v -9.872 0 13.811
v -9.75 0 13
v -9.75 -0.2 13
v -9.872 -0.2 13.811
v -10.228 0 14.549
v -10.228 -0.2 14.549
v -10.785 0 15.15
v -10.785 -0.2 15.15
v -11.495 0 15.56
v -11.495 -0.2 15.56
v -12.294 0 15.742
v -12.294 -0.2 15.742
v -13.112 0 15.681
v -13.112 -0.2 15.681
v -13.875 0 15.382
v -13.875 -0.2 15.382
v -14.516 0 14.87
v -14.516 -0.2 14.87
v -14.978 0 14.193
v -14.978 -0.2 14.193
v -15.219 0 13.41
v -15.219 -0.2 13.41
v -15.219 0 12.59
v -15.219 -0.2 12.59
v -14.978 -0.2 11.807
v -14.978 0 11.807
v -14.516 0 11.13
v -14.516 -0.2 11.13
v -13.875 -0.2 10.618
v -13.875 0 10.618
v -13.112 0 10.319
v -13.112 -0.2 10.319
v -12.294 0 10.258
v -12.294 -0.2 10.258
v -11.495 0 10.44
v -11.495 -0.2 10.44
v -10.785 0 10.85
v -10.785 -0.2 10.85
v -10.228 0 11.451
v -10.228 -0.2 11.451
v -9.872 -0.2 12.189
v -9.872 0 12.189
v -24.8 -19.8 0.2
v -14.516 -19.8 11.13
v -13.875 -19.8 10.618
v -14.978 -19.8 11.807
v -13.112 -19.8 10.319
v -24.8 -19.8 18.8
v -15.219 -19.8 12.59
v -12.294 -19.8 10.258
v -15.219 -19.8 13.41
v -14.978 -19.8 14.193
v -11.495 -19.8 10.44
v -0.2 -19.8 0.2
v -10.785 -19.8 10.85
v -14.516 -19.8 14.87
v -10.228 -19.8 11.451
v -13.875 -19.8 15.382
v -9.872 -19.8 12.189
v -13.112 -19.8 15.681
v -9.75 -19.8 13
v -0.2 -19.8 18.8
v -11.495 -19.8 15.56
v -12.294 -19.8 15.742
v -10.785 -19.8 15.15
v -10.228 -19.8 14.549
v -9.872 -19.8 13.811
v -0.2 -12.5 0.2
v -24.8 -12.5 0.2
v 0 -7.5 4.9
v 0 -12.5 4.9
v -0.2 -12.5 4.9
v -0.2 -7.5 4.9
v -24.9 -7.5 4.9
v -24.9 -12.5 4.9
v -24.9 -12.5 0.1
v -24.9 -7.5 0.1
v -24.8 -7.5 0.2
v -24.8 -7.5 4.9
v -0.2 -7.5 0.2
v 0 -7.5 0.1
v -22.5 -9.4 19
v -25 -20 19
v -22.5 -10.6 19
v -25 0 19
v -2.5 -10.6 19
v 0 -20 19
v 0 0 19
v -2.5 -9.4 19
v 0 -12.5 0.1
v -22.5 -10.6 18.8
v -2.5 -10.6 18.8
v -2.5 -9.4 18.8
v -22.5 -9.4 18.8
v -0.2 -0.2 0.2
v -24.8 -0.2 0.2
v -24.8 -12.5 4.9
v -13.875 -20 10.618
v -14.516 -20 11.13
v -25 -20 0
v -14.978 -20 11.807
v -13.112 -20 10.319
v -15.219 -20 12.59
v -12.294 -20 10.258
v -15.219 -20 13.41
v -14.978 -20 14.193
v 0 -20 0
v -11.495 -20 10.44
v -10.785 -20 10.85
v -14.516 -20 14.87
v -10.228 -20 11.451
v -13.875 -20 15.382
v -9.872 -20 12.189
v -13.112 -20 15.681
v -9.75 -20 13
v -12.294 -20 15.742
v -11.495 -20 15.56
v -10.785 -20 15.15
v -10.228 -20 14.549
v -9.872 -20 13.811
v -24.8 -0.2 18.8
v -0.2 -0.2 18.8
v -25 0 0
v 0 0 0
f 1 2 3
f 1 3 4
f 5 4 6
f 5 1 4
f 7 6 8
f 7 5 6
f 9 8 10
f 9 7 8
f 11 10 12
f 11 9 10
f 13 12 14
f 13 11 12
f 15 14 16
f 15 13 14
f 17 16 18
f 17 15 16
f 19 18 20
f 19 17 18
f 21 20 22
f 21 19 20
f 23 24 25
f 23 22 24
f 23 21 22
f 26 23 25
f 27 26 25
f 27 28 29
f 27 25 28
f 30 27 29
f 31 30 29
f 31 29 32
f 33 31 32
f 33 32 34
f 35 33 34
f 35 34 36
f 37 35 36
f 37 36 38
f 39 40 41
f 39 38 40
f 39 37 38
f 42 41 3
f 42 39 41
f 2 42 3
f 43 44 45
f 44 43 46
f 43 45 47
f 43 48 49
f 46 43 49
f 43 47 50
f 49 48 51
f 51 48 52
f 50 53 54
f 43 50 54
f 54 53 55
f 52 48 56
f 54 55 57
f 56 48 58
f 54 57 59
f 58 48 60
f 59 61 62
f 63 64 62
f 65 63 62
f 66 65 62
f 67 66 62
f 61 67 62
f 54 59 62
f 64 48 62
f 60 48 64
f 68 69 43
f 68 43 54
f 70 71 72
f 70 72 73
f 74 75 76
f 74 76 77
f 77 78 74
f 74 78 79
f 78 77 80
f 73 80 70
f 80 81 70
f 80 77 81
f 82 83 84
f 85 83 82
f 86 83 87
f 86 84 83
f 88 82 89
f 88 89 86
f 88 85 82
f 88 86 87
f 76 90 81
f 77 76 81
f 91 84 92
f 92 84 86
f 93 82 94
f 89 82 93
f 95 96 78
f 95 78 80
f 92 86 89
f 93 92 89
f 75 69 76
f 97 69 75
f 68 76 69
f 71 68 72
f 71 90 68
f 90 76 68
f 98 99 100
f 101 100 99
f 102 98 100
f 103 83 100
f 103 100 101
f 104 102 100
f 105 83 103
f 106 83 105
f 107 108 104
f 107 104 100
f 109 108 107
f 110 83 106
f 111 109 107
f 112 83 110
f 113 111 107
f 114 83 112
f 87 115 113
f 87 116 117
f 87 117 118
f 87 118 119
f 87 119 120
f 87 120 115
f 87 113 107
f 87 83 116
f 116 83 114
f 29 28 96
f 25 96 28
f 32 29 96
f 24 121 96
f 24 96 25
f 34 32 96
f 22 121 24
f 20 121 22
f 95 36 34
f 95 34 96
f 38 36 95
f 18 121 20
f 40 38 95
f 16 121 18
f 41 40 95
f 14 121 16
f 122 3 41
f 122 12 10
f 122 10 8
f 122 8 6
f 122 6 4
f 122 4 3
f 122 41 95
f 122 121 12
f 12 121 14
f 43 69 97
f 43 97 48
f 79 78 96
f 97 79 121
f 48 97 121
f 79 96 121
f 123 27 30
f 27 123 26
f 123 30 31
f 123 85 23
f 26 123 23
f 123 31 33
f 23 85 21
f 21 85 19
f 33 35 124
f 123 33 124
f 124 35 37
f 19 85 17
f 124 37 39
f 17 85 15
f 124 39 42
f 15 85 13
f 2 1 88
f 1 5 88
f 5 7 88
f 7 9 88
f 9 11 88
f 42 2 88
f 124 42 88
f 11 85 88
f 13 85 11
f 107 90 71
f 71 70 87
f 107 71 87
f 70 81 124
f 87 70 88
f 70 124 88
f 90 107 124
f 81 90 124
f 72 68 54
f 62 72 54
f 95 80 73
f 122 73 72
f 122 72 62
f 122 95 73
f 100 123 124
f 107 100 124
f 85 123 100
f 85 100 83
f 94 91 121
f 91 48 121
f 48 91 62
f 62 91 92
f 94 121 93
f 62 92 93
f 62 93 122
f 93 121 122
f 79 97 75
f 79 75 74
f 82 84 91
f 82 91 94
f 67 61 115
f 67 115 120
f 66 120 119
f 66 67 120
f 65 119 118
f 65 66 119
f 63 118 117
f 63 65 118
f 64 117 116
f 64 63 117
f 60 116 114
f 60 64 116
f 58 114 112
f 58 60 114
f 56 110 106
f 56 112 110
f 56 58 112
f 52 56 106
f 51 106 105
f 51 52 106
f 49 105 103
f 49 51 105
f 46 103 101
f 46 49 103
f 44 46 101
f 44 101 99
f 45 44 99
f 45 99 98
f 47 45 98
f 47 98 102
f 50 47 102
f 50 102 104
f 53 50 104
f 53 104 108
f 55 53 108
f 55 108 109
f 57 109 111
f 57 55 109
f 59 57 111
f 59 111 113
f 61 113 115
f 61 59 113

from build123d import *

# Parameters (mm, degrees)
F0_W     = 25
F0_H     = 19
F1_DEPTH = 20
F3_T     = -0.2
F2_R     = 2.75
F4_DEPTH = 25
F5_W     = 20
F5_H     = 1.2
F6_DEPTH = 1
F7_W     = 5
F7_H     = 4.8
F8_DEPTH = 24.9


with BuildPart() as f1:
    # F0 (on Front) → F1 (new body)
    with BuildSketch(Plane.XZ):
        with Locations((-12.5, 9.5)):
            Rectangle(F0_W, F0_H)
    extrude(amount=F1_DEPTH)

    # F3 (hollow: no face is removed)
    offset(amount=F3_T, mode=Mode.SUBTRACT)

    # F2 (on Front) → F4 (cut)
    with BuildSketch(Plane.XZ):
        with Locations((-12.5, 13)):
            Circle(F2_R)
    extrude(amount=F4_DEPTH, mode=Mode.SUBTRACT)

    # F5 (on face) → F6 (cut)
    with BuildSketch(Plane.XY.offset(19)):
        with Locations((-12.5, -10)):
            Rectangle(F5_W, F5_H)
    extrude(amount=-F6_DEPTH, mode=Mode.SUBTRACT)

    # F7 (on face) → F8 (cut)
    with BuildSketch(Plane.YZ):
        with Locations((-10, 2.5)):
            Rectangle(F7_W, F7_H)
    extrude(amount=-F8_DEPTH, mode=Mode.SUBTRACT)


solid = f1.part
